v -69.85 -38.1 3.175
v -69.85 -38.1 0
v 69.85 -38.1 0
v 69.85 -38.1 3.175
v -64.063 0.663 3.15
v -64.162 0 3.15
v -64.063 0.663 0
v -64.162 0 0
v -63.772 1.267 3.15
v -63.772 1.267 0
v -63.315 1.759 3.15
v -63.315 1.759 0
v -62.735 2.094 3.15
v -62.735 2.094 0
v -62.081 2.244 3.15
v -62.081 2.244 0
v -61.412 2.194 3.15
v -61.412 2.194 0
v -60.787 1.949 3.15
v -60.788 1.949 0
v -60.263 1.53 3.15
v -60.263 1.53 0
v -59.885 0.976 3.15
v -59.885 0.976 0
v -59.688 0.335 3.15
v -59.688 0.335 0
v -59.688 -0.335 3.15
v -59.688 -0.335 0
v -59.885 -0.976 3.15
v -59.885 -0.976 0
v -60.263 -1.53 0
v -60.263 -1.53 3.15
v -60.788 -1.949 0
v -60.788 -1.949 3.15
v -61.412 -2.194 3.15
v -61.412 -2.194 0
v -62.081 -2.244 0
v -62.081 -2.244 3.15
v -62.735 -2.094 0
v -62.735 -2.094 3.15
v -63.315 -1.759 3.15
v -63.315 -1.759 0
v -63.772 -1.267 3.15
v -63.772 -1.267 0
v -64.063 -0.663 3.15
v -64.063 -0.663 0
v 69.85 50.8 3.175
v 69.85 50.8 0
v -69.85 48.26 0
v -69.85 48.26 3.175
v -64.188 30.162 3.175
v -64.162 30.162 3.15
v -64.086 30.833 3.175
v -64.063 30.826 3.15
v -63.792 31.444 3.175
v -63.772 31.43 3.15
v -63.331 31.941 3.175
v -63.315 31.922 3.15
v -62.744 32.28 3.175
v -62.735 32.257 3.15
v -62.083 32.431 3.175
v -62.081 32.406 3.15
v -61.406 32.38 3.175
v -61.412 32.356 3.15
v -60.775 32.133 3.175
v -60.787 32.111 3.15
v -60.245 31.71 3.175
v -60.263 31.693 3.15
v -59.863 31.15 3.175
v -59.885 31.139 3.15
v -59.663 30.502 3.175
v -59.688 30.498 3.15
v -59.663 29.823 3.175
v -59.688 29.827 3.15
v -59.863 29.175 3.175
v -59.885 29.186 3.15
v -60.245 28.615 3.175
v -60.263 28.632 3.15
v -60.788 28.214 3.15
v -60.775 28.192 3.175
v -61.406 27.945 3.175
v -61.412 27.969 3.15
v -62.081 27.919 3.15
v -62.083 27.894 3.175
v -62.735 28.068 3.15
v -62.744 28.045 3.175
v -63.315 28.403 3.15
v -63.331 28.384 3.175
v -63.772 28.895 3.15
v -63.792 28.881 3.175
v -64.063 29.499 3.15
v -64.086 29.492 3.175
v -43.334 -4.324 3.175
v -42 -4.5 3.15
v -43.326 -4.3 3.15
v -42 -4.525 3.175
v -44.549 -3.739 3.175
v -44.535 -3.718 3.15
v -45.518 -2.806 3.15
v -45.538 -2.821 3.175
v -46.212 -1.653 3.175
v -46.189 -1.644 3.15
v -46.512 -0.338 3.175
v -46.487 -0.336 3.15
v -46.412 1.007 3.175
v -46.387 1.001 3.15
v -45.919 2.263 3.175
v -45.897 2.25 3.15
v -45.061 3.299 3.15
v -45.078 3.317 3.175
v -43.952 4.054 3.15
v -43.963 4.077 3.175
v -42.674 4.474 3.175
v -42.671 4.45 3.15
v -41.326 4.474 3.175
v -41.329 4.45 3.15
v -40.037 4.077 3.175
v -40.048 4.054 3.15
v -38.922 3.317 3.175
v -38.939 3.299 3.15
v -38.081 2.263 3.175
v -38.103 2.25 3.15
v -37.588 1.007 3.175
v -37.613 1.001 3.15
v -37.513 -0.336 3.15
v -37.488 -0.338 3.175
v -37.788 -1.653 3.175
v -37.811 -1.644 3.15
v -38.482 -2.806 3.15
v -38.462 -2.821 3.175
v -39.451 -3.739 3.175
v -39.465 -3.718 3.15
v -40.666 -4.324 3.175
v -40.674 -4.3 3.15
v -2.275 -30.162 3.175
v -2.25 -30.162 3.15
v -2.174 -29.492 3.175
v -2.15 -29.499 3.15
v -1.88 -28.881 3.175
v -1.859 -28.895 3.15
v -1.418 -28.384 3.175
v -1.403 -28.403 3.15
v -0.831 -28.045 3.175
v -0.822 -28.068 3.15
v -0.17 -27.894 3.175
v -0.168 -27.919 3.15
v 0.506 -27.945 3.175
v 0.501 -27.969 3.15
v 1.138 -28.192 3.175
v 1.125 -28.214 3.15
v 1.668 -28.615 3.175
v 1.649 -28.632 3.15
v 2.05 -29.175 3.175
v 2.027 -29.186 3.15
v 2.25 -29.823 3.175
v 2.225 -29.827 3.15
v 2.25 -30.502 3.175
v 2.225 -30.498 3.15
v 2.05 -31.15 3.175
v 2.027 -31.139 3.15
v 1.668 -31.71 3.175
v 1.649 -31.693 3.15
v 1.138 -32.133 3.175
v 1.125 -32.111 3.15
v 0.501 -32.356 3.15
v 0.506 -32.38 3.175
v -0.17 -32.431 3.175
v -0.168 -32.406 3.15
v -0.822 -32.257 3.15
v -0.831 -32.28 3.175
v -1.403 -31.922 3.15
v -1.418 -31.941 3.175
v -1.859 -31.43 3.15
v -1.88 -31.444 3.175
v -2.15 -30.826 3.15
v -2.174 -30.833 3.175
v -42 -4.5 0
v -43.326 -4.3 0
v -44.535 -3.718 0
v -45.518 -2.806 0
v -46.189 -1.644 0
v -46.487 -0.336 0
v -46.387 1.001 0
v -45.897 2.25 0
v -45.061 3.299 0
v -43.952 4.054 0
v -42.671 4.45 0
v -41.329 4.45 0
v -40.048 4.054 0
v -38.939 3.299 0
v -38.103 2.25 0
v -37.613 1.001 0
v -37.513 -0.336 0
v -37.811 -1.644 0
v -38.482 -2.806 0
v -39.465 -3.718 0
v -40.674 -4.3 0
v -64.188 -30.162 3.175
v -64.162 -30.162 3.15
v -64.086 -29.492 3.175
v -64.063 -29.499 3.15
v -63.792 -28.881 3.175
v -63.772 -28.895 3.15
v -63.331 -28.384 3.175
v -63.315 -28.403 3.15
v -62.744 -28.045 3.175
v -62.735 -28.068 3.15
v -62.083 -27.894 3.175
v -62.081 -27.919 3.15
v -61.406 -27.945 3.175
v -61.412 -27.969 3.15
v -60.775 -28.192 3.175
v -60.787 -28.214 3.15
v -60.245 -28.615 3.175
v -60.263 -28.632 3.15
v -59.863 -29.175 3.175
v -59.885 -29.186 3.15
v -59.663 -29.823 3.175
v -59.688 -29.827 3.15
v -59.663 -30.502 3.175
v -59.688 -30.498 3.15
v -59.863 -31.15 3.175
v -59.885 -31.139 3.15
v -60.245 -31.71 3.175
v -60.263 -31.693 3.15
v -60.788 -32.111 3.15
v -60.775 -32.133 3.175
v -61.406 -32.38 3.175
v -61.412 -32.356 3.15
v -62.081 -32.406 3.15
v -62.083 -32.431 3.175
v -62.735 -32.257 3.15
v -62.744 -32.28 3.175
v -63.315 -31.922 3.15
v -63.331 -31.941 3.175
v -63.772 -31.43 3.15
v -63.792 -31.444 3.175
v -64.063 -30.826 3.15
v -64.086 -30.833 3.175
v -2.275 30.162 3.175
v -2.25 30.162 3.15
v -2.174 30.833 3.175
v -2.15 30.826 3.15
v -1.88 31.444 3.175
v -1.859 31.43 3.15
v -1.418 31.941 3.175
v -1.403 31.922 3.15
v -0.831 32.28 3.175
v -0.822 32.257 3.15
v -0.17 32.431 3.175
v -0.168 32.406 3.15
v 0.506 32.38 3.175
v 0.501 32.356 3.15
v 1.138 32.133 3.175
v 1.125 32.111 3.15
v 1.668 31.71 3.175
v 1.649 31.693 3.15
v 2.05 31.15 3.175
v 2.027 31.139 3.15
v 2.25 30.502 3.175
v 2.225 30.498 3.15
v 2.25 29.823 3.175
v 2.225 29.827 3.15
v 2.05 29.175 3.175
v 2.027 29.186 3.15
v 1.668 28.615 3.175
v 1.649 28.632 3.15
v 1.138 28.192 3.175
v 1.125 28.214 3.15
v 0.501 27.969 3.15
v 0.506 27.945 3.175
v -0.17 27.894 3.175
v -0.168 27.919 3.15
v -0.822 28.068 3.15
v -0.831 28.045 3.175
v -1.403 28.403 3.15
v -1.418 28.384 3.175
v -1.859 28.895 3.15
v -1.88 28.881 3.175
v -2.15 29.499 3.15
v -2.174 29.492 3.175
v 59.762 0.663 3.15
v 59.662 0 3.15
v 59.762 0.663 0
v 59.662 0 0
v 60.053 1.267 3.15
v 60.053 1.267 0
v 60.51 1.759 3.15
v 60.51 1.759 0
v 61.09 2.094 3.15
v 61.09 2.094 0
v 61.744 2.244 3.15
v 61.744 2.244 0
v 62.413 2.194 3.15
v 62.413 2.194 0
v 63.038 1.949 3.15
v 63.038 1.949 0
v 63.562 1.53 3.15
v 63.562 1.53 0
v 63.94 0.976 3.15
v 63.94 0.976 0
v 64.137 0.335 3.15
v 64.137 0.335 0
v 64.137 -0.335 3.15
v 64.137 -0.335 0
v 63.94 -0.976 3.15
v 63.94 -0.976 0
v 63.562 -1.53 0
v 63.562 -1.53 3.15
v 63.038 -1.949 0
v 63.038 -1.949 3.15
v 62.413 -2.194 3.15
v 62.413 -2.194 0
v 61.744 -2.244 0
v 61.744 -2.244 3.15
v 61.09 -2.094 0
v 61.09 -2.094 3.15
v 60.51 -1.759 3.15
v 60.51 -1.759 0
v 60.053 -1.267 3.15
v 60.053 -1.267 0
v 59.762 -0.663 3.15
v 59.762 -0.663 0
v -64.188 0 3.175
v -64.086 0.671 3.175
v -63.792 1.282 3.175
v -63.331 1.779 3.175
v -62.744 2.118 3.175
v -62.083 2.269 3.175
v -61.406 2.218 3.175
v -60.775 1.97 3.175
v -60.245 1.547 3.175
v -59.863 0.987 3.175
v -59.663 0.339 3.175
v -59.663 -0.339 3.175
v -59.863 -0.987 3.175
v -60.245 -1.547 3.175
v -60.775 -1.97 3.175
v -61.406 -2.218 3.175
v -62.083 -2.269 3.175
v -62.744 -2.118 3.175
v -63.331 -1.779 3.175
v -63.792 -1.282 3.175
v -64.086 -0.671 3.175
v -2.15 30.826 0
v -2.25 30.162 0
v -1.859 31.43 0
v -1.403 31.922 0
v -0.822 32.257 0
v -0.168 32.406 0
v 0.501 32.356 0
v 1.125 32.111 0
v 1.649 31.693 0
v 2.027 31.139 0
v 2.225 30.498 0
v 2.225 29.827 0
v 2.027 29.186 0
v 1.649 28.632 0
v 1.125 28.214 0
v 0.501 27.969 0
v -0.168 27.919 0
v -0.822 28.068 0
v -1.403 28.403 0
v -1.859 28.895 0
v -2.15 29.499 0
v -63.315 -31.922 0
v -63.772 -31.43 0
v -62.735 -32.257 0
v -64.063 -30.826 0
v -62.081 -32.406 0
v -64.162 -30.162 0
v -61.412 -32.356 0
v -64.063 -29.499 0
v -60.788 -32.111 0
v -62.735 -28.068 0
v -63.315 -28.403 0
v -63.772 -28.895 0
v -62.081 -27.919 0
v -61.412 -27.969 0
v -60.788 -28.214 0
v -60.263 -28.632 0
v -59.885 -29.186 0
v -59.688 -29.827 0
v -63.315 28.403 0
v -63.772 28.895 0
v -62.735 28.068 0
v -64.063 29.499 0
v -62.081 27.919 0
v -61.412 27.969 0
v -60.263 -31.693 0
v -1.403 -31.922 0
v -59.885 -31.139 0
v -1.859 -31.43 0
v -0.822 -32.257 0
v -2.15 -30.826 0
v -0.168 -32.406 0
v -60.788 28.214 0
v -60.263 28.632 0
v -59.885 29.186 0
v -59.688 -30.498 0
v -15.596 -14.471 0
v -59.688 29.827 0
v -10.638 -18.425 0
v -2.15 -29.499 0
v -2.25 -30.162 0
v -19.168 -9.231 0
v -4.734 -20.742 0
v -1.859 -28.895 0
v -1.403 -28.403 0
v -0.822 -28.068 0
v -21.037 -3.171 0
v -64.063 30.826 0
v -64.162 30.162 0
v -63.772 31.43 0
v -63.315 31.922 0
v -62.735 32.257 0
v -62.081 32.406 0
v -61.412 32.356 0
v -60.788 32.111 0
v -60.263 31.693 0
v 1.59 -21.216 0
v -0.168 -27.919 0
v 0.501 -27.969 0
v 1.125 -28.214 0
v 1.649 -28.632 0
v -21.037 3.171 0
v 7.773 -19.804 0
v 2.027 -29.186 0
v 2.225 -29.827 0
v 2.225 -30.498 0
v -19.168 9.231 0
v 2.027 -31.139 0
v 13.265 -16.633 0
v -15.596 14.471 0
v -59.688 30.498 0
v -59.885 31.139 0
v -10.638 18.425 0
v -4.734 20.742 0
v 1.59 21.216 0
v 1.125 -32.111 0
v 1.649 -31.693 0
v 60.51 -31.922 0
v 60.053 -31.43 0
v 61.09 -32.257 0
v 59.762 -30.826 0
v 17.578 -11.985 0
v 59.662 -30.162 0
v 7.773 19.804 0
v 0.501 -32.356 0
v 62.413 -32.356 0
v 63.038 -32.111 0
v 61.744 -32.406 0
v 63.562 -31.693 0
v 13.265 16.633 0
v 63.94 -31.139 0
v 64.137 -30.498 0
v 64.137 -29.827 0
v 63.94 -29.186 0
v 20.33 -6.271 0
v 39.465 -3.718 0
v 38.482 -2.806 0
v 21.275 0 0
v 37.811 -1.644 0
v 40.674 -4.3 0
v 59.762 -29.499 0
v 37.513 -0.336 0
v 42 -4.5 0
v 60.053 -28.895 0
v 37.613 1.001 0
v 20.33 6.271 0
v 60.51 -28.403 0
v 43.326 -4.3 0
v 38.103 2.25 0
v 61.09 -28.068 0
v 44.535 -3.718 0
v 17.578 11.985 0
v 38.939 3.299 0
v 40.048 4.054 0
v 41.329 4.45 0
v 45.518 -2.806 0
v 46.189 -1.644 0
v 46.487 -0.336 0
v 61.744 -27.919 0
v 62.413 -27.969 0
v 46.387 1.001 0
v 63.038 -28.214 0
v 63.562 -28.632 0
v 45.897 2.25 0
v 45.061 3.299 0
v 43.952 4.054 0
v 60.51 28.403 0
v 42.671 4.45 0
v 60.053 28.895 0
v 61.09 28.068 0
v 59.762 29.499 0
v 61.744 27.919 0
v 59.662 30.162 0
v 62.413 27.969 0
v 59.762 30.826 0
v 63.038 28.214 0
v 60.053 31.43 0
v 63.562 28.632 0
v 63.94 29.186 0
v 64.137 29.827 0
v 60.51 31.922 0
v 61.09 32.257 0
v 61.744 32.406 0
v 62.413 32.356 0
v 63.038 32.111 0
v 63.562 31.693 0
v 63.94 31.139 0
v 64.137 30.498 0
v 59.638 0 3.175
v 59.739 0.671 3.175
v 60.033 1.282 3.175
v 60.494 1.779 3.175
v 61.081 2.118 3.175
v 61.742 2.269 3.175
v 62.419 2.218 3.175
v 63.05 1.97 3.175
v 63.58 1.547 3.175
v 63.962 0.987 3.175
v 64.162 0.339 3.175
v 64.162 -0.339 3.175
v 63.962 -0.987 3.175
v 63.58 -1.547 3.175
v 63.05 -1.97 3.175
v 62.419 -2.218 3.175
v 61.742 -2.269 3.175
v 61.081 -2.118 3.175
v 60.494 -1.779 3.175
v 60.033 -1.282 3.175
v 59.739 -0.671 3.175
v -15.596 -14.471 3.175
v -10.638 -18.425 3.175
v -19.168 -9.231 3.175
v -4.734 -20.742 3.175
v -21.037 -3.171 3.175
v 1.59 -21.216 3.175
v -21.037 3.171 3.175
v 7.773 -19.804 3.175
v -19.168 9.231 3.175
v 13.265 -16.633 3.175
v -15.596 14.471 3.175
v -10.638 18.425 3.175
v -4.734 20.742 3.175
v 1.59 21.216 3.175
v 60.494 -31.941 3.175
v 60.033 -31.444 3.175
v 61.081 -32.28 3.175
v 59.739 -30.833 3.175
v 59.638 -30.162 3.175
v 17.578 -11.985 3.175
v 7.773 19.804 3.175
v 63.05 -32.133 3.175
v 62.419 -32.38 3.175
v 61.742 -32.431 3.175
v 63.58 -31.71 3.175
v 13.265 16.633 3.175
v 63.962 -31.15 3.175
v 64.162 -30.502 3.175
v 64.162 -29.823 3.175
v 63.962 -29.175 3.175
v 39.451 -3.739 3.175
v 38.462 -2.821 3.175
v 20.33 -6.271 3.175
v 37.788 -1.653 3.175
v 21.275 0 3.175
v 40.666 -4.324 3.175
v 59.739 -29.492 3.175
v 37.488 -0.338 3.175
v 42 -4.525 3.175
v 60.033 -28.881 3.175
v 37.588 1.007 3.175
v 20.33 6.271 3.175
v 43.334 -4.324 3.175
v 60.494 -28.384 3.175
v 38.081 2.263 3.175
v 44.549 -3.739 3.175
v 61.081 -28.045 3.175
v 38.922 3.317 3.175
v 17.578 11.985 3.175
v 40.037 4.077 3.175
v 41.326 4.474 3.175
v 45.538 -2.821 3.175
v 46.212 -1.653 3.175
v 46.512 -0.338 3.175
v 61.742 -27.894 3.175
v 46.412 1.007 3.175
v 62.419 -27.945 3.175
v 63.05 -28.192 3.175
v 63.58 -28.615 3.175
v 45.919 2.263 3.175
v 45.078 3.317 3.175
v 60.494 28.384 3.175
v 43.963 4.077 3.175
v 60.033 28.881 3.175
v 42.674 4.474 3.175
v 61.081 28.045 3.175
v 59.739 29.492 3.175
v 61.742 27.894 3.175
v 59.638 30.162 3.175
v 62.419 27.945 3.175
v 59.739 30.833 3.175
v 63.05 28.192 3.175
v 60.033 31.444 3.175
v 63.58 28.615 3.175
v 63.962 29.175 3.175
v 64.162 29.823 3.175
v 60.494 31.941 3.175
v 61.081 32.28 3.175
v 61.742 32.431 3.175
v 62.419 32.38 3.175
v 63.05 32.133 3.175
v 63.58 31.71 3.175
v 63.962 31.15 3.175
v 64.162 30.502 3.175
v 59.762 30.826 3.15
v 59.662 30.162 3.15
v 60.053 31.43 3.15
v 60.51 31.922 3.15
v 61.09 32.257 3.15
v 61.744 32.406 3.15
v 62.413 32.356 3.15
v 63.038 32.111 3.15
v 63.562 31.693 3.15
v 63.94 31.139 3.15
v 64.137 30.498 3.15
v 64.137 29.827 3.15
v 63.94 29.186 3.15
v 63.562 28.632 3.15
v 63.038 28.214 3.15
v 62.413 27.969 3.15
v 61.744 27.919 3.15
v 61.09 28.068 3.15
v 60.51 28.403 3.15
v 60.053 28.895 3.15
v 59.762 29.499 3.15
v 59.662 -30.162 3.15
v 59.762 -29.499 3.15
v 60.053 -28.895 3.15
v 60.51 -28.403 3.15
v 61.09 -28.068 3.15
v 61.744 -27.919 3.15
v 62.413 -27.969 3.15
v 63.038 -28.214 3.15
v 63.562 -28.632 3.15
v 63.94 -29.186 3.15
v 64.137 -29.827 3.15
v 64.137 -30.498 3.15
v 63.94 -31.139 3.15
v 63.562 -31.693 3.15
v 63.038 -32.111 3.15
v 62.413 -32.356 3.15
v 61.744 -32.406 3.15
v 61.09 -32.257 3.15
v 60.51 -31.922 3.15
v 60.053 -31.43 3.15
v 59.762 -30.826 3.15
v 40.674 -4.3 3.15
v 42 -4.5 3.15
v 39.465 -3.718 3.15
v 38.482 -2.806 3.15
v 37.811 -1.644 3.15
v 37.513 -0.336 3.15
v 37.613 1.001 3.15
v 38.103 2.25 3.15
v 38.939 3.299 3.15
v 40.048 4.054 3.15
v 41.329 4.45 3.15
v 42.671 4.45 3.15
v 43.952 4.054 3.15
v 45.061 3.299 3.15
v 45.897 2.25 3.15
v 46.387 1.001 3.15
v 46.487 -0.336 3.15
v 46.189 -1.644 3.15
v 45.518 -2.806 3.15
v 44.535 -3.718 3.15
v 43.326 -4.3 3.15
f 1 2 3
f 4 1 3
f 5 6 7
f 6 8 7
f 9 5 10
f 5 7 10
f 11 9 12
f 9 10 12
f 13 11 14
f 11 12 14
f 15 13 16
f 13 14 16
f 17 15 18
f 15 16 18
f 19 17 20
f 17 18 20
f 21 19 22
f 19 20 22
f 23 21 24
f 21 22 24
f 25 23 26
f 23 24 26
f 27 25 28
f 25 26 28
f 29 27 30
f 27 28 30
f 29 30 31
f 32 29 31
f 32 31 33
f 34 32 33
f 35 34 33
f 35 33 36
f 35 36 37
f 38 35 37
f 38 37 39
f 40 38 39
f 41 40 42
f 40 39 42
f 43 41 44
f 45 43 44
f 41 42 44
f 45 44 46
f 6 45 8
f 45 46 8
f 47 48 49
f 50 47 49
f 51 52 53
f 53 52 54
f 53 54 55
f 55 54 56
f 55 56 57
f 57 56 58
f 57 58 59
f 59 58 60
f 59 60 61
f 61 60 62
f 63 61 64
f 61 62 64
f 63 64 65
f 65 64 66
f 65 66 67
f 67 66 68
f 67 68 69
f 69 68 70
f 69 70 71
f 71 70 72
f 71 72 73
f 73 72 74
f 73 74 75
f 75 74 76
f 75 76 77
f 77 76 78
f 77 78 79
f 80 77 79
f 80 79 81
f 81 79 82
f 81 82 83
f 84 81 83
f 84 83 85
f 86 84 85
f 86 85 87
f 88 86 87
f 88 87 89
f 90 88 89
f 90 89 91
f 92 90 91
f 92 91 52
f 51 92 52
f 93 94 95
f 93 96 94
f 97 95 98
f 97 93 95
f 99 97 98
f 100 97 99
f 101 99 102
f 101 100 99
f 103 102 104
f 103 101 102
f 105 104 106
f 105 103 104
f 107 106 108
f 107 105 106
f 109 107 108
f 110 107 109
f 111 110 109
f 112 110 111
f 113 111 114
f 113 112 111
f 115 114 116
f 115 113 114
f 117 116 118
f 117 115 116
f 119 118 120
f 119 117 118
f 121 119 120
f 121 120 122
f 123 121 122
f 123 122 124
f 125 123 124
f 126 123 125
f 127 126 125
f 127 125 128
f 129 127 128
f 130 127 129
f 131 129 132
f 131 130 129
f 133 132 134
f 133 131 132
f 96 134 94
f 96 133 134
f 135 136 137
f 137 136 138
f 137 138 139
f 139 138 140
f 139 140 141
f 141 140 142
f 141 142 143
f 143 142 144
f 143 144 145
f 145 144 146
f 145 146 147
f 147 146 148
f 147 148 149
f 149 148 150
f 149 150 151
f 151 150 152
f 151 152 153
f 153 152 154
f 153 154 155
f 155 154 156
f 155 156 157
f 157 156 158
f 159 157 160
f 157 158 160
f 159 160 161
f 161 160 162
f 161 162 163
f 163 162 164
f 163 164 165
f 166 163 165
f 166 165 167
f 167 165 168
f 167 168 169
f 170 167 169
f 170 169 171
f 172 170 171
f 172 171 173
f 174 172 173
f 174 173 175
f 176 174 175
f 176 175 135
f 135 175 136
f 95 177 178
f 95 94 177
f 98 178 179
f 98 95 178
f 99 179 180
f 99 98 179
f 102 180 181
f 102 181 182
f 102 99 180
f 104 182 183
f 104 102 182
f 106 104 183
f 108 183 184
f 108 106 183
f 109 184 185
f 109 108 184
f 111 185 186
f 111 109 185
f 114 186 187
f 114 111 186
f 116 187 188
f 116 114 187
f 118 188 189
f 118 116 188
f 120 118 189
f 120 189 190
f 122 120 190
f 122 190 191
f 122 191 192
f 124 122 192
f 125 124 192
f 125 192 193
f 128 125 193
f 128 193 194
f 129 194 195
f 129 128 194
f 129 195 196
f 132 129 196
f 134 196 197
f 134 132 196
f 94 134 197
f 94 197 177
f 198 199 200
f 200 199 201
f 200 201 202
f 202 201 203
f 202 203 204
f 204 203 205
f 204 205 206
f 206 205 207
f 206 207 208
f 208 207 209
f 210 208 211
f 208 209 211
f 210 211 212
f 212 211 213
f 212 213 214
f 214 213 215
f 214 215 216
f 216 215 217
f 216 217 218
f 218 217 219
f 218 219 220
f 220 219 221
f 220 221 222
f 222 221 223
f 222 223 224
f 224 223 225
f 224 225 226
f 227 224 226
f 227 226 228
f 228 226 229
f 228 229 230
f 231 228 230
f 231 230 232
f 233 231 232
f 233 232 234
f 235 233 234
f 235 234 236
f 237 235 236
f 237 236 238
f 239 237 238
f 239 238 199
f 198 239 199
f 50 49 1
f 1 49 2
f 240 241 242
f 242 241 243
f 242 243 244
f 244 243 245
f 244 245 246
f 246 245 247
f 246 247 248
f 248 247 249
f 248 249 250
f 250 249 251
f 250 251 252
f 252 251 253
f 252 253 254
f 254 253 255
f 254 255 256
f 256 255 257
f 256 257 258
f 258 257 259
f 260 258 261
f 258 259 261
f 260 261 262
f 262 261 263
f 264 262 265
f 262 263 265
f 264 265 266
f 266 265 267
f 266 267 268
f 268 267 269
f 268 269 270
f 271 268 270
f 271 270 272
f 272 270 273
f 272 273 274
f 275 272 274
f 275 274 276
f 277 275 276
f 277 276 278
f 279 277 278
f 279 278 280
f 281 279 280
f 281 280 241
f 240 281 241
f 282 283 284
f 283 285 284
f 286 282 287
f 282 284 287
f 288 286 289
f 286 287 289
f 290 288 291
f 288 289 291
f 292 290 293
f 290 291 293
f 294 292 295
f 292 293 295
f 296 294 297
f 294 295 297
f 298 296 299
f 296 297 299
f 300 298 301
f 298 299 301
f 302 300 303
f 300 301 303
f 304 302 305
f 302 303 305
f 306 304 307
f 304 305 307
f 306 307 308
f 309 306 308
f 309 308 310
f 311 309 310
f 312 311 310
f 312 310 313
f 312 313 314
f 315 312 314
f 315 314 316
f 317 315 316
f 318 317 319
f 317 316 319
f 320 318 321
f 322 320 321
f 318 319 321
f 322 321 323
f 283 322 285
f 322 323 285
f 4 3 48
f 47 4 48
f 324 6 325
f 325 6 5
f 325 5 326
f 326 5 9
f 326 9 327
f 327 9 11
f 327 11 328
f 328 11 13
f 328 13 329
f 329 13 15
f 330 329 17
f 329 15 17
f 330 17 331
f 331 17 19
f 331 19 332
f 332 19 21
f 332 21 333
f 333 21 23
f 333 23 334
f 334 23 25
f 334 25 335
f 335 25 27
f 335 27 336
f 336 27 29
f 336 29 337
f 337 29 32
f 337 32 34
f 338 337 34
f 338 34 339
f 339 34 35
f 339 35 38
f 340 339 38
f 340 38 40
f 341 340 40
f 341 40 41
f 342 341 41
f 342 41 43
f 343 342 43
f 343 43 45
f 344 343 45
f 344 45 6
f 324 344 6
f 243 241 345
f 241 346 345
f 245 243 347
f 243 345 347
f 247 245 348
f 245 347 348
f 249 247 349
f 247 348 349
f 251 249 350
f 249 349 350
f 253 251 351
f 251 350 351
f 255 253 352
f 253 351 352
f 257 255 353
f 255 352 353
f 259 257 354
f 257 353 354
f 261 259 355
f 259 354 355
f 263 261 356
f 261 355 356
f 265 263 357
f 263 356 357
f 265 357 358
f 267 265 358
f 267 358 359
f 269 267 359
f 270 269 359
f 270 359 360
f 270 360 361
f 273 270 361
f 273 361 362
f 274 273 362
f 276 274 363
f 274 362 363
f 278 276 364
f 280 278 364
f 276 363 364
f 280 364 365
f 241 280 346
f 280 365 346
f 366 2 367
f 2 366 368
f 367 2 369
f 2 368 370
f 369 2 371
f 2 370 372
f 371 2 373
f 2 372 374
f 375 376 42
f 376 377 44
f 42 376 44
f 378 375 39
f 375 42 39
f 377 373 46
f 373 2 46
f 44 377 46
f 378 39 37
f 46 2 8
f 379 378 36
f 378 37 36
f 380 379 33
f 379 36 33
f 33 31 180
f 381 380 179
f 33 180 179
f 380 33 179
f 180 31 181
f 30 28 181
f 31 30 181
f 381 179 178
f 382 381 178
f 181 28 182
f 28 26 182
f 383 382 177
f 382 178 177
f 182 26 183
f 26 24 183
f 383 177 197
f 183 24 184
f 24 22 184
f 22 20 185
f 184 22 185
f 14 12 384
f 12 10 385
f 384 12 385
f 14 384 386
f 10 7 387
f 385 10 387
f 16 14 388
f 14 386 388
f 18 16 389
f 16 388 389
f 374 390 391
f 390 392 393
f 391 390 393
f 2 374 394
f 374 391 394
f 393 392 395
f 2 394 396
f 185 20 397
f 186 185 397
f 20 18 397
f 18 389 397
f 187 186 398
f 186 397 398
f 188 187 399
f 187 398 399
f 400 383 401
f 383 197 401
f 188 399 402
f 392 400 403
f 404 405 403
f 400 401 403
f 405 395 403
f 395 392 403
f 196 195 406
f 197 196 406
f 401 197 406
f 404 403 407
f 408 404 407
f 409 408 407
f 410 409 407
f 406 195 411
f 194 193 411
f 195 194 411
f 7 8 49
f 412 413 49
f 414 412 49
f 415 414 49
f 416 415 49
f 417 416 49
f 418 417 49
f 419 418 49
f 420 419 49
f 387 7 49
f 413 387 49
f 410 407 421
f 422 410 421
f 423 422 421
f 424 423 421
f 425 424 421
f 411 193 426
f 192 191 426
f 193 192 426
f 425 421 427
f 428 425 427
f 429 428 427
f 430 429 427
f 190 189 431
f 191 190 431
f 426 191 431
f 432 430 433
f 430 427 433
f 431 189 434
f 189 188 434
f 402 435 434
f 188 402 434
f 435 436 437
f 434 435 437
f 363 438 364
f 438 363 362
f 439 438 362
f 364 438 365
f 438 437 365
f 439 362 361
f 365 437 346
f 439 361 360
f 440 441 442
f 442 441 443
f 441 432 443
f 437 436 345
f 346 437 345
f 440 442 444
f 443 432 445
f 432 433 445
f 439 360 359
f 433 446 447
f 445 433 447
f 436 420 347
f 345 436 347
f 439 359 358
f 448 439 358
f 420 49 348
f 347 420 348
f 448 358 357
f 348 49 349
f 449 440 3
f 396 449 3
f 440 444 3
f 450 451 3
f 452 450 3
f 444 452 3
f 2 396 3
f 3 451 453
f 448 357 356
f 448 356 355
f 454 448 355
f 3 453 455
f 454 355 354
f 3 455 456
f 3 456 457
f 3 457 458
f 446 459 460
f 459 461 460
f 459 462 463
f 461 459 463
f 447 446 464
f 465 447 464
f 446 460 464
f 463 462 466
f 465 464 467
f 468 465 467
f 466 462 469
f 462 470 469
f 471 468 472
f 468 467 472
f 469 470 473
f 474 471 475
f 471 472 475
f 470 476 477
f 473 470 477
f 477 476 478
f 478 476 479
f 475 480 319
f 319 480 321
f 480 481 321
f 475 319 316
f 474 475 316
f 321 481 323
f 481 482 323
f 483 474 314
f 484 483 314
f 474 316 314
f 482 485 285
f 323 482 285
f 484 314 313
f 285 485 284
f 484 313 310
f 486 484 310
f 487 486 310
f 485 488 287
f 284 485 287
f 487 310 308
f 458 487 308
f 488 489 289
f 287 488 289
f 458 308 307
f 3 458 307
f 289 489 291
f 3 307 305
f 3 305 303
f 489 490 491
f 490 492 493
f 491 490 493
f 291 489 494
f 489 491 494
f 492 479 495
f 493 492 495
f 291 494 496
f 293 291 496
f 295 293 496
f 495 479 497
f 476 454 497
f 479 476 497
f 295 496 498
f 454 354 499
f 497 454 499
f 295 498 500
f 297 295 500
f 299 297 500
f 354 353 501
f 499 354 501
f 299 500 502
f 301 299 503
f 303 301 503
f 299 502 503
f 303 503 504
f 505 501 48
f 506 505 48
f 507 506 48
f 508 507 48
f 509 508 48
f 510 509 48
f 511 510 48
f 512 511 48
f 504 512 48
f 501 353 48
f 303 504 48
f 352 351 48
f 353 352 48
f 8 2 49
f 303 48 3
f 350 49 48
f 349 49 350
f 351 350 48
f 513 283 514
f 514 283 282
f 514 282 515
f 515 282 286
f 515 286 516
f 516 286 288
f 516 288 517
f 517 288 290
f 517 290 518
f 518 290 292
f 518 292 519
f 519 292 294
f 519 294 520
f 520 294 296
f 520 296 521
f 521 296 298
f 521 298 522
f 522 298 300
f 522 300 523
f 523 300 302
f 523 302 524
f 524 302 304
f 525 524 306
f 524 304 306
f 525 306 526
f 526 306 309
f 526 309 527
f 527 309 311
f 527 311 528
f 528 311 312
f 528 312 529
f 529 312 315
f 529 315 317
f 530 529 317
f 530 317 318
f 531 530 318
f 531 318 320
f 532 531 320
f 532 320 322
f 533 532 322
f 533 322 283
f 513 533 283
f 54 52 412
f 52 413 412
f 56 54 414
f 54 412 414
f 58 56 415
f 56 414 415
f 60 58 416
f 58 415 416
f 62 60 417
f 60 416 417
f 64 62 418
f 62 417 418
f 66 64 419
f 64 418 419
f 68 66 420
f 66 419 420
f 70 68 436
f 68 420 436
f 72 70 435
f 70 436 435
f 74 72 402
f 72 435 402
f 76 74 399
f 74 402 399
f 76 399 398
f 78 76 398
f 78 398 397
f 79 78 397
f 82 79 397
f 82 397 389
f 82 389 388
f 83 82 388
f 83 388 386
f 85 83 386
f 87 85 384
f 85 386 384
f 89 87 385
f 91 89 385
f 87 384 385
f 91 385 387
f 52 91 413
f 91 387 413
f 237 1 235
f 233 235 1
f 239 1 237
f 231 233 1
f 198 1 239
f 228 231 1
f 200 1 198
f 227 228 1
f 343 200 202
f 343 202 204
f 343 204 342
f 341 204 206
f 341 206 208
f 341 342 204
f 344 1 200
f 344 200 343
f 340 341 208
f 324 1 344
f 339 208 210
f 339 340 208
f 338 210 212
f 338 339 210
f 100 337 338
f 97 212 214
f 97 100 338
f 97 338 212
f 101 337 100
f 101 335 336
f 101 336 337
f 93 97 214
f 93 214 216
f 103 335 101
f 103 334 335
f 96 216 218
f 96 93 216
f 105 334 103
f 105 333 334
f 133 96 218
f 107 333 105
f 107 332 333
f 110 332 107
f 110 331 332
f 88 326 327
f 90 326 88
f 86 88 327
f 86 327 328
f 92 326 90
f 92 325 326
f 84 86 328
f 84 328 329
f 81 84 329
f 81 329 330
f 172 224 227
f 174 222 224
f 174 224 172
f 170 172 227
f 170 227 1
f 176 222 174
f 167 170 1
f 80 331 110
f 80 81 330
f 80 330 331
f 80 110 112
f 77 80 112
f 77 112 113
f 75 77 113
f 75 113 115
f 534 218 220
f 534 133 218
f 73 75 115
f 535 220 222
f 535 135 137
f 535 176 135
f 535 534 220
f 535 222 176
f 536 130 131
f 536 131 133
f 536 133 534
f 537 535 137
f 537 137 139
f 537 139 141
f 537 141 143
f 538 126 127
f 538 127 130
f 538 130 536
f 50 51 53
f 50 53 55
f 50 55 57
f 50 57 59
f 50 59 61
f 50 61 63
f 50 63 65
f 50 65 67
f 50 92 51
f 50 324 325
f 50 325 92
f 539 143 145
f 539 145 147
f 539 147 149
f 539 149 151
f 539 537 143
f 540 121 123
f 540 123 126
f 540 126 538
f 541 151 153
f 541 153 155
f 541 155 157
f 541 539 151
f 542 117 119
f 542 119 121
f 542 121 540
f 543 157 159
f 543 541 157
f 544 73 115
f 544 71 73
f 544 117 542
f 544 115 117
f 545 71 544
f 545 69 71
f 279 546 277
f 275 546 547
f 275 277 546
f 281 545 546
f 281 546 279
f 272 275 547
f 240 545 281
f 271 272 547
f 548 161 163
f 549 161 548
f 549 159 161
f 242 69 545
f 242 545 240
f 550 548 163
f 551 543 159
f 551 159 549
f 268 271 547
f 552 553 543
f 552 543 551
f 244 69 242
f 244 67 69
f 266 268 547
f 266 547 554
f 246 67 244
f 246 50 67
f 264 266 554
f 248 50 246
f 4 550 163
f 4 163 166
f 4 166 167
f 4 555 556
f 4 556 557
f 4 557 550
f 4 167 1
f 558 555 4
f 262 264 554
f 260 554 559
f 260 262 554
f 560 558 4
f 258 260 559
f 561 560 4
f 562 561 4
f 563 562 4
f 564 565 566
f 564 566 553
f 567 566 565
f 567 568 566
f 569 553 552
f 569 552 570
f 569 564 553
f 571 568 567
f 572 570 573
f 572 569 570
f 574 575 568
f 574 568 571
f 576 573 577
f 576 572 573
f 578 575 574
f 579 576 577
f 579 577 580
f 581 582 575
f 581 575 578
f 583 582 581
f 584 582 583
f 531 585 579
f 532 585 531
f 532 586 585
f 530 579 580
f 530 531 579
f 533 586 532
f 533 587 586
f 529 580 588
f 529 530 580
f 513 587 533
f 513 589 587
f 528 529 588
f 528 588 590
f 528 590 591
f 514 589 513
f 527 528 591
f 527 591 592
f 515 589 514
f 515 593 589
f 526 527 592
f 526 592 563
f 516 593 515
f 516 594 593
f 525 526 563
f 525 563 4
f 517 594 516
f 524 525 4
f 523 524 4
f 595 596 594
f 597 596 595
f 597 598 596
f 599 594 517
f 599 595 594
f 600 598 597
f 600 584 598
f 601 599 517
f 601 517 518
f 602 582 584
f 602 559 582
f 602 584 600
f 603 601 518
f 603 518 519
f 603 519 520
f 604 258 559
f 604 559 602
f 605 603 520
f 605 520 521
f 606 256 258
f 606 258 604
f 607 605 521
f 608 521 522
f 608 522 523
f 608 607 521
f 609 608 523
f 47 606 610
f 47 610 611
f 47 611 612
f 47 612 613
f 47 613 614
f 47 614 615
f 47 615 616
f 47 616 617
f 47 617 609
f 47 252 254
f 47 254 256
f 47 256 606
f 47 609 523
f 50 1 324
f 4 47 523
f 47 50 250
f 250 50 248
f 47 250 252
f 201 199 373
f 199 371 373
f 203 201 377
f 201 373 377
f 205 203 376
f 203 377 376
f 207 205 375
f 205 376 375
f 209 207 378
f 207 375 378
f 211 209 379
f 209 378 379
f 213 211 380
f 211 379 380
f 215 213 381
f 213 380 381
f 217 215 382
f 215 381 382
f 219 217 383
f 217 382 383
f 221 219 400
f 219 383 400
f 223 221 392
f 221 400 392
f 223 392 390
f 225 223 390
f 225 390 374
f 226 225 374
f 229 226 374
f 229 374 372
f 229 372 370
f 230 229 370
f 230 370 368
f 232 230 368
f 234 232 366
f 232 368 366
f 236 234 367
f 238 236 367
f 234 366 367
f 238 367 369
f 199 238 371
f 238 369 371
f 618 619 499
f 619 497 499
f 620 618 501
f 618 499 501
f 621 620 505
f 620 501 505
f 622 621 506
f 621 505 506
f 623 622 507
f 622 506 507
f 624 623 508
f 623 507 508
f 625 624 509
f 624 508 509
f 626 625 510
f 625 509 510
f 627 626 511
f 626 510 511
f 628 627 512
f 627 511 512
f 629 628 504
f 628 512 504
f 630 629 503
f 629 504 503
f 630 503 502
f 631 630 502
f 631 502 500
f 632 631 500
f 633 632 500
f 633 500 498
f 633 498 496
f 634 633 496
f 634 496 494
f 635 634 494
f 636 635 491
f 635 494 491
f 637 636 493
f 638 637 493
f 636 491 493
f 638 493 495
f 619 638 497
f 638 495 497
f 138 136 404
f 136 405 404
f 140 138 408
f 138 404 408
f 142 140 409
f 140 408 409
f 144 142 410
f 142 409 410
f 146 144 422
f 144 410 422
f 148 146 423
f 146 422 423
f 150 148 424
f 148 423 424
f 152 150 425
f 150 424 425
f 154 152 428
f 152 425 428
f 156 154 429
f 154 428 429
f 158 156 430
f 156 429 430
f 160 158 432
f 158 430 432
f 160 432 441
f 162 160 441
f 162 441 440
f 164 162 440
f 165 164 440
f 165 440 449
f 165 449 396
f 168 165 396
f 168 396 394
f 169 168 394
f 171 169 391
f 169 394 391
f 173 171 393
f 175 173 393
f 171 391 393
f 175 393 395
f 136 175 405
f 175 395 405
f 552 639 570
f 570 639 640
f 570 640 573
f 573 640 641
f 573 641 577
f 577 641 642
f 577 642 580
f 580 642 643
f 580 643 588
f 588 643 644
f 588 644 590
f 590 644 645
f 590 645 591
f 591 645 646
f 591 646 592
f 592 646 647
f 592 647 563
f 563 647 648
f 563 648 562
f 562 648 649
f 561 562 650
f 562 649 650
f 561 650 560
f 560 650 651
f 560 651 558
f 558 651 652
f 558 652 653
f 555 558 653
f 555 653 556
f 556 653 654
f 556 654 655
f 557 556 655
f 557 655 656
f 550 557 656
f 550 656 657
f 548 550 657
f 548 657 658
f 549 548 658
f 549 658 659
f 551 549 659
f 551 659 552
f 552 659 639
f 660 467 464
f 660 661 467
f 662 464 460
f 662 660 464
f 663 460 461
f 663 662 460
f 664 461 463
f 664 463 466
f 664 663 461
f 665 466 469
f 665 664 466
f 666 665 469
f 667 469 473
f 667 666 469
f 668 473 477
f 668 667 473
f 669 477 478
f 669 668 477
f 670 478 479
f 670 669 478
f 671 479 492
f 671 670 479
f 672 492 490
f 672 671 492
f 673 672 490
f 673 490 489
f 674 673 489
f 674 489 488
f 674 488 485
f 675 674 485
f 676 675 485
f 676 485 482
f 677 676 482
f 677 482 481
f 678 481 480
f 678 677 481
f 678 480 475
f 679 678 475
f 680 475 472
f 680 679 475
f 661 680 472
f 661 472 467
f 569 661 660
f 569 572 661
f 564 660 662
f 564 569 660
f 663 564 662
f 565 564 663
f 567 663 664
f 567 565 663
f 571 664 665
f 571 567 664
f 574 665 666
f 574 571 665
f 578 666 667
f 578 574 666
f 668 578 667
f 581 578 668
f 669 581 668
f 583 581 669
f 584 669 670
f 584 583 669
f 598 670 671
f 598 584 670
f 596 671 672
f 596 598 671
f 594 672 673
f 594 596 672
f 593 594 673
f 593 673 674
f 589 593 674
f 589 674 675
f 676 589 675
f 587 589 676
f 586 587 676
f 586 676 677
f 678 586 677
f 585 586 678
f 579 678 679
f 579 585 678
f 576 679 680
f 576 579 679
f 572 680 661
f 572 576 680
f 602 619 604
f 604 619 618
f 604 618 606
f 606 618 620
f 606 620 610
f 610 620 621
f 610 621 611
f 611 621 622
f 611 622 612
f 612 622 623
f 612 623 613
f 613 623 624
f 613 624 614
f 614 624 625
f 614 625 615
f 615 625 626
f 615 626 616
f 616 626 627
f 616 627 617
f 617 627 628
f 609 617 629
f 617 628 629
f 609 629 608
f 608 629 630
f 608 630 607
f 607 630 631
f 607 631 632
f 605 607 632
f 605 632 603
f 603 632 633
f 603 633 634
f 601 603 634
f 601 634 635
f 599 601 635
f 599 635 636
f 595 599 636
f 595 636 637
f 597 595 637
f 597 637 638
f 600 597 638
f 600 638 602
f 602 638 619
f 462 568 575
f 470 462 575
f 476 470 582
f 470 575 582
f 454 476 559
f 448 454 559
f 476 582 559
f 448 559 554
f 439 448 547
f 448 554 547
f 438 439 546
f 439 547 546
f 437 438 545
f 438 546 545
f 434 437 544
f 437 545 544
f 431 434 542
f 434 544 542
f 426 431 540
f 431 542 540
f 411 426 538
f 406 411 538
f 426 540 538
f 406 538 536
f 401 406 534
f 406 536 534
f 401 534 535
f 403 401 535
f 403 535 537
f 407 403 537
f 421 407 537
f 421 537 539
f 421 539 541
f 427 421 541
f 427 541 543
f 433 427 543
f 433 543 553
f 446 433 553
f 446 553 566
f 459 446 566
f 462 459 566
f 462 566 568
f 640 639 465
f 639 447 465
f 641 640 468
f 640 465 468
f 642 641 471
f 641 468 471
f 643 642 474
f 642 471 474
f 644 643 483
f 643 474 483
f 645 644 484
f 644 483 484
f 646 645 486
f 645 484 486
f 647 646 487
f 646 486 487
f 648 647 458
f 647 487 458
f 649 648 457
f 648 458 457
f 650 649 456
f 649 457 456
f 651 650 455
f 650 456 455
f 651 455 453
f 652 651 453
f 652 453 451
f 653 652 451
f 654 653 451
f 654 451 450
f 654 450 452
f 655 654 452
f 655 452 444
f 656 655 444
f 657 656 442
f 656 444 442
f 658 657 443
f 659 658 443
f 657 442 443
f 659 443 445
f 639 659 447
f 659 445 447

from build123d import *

# Parameters (mm, degrees)
BOSS_EXTRUDE1_DEPTH            = 3.175
M4_CLEARANCE_HOLE1_D           = 4.5
M4_CLEARANCE_HOLE1_CSINK_D     = 4.55
M4_CLEARANCE_HOLE1_CSINK_ANGLE = 90
M8_CLEARANCE_HOLE1_AT_2_COUNT  = 2
M8_CLEARANCE_HOLE1_AT_2_PITCH  = 84
SKETCH9_R                      = 21.275
CENTER_HOLE_DEPTH              = 87.427675689


with BuildPart() as part:
    # Sketch1 → Boss-Extrude1 (new body)
    with BuildSketch(Plane.XY):
        Polygon((-69.85, 48.26), (-69.85, 38.1), (-69.85, -38.1), (69.85, -38.1), (69.85, 38.1), (69.85, 50.8), align=None)
    extrude(amount=BOSS_EXTRUDE1_DEPTH)

    # M4 Clearance Hole1 (through all)
    with Locations(Plane.XY.offset(3.175)):
        with Locations((-61.9125, -30.1625), (0, -30.1625), (61.9125, -30.1625), (61.9125, 30.1625), (61.9125, 0), (0, 30.1625), (-61.9125, 30.1625), (-61.9125, 0)):
            CounterSinkHole(M4_CLEARANCE_HOLE1_D / 2, M4_CLEARANCE_HOLE1_CSINK_D / 2, counter_sink_angle=M4_CLEARANCE_HOLE1_CSINK_ANGLE)

    # Sketch11 → M8 Clearance Hole1 (revolve, cut)
    with BuildSketch(Plane(origin=(-42, 0, 3.175), x_dir=(0, -1, 0), z_dir=(1, 0, 0))):
        Polygon((0, 0), (0, 3.175), (4.5, 3.175), (4.5, 0.025), (4.525, 0), align=None)
    m8_clearance_hole1 = revolve(axis=Axis((-42, 0, 9.525), (0, 0, -1)), mode=Mode.SUBTRACT)

    # M8 Clearance Hole1 at 2: M8 Clearance Hole1 ×2
    with Locations(*[(i * M8_CLEARANCE_HOLE1_AT_2_PITCH, 0, 0) for i in range(1, M8_CLEARANCE_HOLE1_AT_2_COUNT)]):
        add(m8_clearance_hole1, mode=Mode.SUBTRACT)

    # Sketch9 → Center Hole (cut, through all)
    with BuildSketch(Plane.XY.offset(3.175)):
        Circle(SKETCH9_R)
    extrude(amount=-CENTER_HOLE_DEPTH, mode=Mode.SUBTRACT)


solid = part.part
